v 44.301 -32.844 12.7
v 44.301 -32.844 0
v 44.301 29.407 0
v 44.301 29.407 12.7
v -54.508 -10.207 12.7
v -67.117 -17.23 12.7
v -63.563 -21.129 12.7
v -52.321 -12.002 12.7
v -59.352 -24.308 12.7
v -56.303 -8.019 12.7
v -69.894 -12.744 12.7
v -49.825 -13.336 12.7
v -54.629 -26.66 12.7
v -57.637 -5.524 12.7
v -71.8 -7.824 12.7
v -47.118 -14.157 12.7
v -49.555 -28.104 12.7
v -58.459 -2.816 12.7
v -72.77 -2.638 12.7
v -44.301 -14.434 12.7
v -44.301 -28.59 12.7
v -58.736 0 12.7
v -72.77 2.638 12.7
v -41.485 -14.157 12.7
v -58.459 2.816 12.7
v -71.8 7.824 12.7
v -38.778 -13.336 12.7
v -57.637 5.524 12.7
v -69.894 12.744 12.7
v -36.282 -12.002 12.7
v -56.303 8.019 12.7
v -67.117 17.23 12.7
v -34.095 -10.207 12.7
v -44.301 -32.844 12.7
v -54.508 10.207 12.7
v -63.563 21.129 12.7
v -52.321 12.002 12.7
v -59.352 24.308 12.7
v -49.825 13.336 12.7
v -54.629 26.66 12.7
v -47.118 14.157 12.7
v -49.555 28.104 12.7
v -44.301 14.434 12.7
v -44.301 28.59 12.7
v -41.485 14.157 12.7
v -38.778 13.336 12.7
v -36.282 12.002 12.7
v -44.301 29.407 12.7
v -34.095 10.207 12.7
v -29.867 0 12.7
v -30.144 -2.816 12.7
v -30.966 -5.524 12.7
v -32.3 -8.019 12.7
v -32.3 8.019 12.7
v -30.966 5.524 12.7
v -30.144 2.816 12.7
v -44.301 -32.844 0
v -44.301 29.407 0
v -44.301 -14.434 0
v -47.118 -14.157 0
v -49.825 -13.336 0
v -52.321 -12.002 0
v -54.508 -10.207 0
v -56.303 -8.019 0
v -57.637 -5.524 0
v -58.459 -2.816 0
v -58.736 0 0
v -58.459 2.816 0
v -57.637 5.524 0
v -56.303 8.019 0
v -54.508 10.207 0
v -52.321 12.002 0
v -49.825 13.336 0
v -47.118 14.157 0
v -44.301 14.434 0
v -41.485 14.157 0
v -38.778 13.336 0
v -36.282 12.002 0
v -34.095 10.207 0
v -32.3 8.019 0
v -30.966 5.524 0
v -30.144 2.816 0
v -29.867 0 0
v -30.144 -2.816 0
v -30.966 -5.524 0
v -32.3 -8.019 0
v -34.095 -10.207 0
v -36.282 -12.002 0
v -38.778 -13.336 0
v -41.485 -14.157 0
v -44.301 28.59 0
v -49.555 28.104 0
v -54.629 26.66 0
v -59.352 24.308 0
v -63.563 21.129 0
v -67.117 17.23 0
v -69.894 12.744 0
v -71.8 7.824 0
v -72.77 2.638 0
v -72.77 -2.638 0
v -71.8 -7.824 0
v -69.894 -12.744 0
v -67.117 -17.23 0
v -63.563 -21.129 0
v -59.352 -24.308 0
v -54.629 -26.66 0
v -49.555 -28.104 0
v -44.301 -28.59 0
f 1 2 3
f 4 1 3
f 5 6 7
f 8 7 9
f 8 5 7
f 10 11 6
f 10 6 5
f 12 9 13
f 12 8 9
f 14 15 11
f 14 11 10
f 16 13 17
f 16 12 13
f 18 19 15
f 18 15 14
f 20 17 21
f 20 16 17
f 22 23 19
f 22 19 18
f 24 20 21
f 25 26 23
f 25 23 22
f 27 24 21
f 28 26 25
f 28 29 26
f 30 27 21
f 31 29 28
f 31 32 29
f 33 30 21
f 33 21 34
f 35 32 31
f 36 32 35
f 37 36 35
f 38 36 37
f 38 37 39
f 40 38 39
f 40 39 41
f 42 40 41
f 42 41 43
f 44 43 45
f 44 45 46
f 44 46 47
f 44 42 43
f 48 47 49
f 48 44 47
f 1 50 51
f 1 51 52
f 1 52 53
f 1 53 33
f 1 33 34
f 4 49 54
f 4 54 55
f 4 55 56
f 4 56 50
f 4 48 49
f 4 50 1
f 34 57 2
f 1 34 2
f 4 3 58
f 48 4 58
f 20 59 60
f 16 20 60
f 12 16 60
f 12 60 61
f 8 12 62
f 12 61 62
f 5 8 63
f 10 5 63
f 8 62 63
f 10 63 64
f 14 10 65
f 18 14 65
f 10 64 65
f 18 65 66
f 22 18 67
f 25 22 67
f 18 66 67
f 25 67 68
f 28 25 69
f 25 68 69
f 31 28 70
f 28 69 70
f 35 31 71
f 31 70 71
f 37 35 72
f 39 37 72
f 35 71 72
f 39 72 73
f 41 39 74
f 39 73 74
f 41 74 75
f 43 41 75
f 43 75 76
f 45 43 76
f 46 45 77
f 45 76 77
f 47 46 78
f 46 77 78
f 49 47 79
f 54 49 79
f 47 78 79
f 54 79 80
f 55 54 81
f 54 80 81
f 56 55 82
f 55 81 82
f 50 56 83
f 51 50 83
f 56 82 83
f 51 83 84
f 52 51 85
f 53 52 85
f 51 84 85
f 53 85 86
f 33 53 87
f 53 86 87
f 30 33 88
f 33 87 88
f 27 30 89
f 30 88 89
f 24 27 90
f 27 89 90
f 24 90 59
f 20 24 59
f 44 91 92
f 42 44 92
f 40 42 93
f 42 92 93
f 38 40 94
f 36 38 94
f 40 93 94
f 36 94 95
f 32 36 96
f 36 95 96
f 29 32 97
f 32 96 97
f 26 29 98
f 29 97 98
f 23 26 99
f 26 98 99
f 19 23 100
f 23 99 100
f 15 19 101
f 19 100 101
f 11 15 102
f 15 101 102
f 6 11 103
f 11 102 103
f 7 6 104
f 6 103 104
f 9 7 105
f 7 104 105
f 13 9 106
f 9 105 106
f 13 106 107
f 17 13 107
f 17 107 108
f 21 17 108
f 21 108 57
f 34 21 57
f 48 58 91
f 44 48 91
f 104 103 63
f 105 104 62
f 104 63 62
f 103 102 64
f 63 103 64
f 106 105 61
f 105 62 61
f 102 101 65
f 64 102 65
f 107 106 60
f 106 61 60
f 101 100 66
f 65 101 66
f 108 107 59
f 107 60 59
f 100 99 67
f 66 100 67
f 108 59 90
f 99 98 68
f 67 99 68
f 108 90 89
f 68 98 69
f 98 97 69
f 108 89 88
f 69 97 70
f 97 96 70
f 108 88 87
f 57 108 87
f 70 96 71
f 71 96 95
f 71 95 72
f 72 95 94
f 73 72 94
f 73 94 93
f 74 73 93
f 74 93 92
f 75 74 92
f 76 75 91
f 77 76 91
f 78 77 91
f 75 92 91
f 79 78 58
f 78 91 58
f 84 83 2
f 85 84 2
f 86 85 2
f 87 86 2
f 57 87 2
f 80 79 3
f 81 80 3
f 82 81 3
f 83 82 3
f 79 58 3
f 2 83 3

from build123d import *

# Parameters (mm, degrees)
F1_DEPTH = 12.7


with BuildPart() as f1:
    # F0 (on Top) → F1 (new body)
    with BuildSketch(Plane.XY):
        with BuildLine():
            Line((-44.3014800549, -32.8442007303), (44.3014800549, -32.8442007303))
            Line((44.3014800549, -32.8442007303), (44.3014800549, 29.407016933))
            Line((44.3014800549, 29.407016933), (-44.3014800549, 29.407016933))
            Line((-44.3014800549, 29.407016933), (-44.3014800549, 28.5903187115))
            ThreePointArc((-44.3014800549, 28.5903187115), (-24.0850718176, 20.2164082372), (-15.7111613433, 0))
            ThreePointArc((-15.7111613433, 0), (-24.0850718176, -20.2164082372), (-44.3014800549, -28.5903187115))
            Line((-44.3014800549, -28.5903187115), (-44.3014800549, -32.8442007303))
        make_face()
        with BuildLine():
            ThreePointArc((-44.3014800549, 28.5903187115), (-72.8917987664, 0), (-44.3014800549, -28.5903187115))
            Line((-44.3014800549, -28.5903187115), (-44.3014800549, -14.4344542652))
            ThreePointArc((-44.3014800549, -14.4344542652), (-58.73593432, 0), (-44.3014800549, 14.4344542652))
            Line((-44.3014800549, 14.4344542652), (-44.3014800549, 28.5903187115))
        make_face()
        with BuildLine():
            Line((-44.3014800549, -14.4344542652), (-44.3014800549, -28.5903187115))
            ThreePointArc((-44.3014800549, -28.5903187115), (-24.0850718176, -20.2164082372), (-15.7111613433, 0))
            ThreePointArc((-15.7111613433, 0), (-24.0850718176, 20.2164082372), (-44.3014800549, 28.5903187115))
            Line((-44.3014800549, 28.5903187115), (-44.3014800549, 14.4344542652))
            ThreePointArc((-44.3014800549, 14.4344542652), (-34.0947795612, 10.2067004936), (-29.8670257897, 0))
            ThreePointArc((-29.8670257897, 0), (-34.0947795612, -10.2067004936), (-44.3014800549, -14.4344542652))
        make_face()
    extrude(amount=F1_DEPTH)


solid = f1.part
